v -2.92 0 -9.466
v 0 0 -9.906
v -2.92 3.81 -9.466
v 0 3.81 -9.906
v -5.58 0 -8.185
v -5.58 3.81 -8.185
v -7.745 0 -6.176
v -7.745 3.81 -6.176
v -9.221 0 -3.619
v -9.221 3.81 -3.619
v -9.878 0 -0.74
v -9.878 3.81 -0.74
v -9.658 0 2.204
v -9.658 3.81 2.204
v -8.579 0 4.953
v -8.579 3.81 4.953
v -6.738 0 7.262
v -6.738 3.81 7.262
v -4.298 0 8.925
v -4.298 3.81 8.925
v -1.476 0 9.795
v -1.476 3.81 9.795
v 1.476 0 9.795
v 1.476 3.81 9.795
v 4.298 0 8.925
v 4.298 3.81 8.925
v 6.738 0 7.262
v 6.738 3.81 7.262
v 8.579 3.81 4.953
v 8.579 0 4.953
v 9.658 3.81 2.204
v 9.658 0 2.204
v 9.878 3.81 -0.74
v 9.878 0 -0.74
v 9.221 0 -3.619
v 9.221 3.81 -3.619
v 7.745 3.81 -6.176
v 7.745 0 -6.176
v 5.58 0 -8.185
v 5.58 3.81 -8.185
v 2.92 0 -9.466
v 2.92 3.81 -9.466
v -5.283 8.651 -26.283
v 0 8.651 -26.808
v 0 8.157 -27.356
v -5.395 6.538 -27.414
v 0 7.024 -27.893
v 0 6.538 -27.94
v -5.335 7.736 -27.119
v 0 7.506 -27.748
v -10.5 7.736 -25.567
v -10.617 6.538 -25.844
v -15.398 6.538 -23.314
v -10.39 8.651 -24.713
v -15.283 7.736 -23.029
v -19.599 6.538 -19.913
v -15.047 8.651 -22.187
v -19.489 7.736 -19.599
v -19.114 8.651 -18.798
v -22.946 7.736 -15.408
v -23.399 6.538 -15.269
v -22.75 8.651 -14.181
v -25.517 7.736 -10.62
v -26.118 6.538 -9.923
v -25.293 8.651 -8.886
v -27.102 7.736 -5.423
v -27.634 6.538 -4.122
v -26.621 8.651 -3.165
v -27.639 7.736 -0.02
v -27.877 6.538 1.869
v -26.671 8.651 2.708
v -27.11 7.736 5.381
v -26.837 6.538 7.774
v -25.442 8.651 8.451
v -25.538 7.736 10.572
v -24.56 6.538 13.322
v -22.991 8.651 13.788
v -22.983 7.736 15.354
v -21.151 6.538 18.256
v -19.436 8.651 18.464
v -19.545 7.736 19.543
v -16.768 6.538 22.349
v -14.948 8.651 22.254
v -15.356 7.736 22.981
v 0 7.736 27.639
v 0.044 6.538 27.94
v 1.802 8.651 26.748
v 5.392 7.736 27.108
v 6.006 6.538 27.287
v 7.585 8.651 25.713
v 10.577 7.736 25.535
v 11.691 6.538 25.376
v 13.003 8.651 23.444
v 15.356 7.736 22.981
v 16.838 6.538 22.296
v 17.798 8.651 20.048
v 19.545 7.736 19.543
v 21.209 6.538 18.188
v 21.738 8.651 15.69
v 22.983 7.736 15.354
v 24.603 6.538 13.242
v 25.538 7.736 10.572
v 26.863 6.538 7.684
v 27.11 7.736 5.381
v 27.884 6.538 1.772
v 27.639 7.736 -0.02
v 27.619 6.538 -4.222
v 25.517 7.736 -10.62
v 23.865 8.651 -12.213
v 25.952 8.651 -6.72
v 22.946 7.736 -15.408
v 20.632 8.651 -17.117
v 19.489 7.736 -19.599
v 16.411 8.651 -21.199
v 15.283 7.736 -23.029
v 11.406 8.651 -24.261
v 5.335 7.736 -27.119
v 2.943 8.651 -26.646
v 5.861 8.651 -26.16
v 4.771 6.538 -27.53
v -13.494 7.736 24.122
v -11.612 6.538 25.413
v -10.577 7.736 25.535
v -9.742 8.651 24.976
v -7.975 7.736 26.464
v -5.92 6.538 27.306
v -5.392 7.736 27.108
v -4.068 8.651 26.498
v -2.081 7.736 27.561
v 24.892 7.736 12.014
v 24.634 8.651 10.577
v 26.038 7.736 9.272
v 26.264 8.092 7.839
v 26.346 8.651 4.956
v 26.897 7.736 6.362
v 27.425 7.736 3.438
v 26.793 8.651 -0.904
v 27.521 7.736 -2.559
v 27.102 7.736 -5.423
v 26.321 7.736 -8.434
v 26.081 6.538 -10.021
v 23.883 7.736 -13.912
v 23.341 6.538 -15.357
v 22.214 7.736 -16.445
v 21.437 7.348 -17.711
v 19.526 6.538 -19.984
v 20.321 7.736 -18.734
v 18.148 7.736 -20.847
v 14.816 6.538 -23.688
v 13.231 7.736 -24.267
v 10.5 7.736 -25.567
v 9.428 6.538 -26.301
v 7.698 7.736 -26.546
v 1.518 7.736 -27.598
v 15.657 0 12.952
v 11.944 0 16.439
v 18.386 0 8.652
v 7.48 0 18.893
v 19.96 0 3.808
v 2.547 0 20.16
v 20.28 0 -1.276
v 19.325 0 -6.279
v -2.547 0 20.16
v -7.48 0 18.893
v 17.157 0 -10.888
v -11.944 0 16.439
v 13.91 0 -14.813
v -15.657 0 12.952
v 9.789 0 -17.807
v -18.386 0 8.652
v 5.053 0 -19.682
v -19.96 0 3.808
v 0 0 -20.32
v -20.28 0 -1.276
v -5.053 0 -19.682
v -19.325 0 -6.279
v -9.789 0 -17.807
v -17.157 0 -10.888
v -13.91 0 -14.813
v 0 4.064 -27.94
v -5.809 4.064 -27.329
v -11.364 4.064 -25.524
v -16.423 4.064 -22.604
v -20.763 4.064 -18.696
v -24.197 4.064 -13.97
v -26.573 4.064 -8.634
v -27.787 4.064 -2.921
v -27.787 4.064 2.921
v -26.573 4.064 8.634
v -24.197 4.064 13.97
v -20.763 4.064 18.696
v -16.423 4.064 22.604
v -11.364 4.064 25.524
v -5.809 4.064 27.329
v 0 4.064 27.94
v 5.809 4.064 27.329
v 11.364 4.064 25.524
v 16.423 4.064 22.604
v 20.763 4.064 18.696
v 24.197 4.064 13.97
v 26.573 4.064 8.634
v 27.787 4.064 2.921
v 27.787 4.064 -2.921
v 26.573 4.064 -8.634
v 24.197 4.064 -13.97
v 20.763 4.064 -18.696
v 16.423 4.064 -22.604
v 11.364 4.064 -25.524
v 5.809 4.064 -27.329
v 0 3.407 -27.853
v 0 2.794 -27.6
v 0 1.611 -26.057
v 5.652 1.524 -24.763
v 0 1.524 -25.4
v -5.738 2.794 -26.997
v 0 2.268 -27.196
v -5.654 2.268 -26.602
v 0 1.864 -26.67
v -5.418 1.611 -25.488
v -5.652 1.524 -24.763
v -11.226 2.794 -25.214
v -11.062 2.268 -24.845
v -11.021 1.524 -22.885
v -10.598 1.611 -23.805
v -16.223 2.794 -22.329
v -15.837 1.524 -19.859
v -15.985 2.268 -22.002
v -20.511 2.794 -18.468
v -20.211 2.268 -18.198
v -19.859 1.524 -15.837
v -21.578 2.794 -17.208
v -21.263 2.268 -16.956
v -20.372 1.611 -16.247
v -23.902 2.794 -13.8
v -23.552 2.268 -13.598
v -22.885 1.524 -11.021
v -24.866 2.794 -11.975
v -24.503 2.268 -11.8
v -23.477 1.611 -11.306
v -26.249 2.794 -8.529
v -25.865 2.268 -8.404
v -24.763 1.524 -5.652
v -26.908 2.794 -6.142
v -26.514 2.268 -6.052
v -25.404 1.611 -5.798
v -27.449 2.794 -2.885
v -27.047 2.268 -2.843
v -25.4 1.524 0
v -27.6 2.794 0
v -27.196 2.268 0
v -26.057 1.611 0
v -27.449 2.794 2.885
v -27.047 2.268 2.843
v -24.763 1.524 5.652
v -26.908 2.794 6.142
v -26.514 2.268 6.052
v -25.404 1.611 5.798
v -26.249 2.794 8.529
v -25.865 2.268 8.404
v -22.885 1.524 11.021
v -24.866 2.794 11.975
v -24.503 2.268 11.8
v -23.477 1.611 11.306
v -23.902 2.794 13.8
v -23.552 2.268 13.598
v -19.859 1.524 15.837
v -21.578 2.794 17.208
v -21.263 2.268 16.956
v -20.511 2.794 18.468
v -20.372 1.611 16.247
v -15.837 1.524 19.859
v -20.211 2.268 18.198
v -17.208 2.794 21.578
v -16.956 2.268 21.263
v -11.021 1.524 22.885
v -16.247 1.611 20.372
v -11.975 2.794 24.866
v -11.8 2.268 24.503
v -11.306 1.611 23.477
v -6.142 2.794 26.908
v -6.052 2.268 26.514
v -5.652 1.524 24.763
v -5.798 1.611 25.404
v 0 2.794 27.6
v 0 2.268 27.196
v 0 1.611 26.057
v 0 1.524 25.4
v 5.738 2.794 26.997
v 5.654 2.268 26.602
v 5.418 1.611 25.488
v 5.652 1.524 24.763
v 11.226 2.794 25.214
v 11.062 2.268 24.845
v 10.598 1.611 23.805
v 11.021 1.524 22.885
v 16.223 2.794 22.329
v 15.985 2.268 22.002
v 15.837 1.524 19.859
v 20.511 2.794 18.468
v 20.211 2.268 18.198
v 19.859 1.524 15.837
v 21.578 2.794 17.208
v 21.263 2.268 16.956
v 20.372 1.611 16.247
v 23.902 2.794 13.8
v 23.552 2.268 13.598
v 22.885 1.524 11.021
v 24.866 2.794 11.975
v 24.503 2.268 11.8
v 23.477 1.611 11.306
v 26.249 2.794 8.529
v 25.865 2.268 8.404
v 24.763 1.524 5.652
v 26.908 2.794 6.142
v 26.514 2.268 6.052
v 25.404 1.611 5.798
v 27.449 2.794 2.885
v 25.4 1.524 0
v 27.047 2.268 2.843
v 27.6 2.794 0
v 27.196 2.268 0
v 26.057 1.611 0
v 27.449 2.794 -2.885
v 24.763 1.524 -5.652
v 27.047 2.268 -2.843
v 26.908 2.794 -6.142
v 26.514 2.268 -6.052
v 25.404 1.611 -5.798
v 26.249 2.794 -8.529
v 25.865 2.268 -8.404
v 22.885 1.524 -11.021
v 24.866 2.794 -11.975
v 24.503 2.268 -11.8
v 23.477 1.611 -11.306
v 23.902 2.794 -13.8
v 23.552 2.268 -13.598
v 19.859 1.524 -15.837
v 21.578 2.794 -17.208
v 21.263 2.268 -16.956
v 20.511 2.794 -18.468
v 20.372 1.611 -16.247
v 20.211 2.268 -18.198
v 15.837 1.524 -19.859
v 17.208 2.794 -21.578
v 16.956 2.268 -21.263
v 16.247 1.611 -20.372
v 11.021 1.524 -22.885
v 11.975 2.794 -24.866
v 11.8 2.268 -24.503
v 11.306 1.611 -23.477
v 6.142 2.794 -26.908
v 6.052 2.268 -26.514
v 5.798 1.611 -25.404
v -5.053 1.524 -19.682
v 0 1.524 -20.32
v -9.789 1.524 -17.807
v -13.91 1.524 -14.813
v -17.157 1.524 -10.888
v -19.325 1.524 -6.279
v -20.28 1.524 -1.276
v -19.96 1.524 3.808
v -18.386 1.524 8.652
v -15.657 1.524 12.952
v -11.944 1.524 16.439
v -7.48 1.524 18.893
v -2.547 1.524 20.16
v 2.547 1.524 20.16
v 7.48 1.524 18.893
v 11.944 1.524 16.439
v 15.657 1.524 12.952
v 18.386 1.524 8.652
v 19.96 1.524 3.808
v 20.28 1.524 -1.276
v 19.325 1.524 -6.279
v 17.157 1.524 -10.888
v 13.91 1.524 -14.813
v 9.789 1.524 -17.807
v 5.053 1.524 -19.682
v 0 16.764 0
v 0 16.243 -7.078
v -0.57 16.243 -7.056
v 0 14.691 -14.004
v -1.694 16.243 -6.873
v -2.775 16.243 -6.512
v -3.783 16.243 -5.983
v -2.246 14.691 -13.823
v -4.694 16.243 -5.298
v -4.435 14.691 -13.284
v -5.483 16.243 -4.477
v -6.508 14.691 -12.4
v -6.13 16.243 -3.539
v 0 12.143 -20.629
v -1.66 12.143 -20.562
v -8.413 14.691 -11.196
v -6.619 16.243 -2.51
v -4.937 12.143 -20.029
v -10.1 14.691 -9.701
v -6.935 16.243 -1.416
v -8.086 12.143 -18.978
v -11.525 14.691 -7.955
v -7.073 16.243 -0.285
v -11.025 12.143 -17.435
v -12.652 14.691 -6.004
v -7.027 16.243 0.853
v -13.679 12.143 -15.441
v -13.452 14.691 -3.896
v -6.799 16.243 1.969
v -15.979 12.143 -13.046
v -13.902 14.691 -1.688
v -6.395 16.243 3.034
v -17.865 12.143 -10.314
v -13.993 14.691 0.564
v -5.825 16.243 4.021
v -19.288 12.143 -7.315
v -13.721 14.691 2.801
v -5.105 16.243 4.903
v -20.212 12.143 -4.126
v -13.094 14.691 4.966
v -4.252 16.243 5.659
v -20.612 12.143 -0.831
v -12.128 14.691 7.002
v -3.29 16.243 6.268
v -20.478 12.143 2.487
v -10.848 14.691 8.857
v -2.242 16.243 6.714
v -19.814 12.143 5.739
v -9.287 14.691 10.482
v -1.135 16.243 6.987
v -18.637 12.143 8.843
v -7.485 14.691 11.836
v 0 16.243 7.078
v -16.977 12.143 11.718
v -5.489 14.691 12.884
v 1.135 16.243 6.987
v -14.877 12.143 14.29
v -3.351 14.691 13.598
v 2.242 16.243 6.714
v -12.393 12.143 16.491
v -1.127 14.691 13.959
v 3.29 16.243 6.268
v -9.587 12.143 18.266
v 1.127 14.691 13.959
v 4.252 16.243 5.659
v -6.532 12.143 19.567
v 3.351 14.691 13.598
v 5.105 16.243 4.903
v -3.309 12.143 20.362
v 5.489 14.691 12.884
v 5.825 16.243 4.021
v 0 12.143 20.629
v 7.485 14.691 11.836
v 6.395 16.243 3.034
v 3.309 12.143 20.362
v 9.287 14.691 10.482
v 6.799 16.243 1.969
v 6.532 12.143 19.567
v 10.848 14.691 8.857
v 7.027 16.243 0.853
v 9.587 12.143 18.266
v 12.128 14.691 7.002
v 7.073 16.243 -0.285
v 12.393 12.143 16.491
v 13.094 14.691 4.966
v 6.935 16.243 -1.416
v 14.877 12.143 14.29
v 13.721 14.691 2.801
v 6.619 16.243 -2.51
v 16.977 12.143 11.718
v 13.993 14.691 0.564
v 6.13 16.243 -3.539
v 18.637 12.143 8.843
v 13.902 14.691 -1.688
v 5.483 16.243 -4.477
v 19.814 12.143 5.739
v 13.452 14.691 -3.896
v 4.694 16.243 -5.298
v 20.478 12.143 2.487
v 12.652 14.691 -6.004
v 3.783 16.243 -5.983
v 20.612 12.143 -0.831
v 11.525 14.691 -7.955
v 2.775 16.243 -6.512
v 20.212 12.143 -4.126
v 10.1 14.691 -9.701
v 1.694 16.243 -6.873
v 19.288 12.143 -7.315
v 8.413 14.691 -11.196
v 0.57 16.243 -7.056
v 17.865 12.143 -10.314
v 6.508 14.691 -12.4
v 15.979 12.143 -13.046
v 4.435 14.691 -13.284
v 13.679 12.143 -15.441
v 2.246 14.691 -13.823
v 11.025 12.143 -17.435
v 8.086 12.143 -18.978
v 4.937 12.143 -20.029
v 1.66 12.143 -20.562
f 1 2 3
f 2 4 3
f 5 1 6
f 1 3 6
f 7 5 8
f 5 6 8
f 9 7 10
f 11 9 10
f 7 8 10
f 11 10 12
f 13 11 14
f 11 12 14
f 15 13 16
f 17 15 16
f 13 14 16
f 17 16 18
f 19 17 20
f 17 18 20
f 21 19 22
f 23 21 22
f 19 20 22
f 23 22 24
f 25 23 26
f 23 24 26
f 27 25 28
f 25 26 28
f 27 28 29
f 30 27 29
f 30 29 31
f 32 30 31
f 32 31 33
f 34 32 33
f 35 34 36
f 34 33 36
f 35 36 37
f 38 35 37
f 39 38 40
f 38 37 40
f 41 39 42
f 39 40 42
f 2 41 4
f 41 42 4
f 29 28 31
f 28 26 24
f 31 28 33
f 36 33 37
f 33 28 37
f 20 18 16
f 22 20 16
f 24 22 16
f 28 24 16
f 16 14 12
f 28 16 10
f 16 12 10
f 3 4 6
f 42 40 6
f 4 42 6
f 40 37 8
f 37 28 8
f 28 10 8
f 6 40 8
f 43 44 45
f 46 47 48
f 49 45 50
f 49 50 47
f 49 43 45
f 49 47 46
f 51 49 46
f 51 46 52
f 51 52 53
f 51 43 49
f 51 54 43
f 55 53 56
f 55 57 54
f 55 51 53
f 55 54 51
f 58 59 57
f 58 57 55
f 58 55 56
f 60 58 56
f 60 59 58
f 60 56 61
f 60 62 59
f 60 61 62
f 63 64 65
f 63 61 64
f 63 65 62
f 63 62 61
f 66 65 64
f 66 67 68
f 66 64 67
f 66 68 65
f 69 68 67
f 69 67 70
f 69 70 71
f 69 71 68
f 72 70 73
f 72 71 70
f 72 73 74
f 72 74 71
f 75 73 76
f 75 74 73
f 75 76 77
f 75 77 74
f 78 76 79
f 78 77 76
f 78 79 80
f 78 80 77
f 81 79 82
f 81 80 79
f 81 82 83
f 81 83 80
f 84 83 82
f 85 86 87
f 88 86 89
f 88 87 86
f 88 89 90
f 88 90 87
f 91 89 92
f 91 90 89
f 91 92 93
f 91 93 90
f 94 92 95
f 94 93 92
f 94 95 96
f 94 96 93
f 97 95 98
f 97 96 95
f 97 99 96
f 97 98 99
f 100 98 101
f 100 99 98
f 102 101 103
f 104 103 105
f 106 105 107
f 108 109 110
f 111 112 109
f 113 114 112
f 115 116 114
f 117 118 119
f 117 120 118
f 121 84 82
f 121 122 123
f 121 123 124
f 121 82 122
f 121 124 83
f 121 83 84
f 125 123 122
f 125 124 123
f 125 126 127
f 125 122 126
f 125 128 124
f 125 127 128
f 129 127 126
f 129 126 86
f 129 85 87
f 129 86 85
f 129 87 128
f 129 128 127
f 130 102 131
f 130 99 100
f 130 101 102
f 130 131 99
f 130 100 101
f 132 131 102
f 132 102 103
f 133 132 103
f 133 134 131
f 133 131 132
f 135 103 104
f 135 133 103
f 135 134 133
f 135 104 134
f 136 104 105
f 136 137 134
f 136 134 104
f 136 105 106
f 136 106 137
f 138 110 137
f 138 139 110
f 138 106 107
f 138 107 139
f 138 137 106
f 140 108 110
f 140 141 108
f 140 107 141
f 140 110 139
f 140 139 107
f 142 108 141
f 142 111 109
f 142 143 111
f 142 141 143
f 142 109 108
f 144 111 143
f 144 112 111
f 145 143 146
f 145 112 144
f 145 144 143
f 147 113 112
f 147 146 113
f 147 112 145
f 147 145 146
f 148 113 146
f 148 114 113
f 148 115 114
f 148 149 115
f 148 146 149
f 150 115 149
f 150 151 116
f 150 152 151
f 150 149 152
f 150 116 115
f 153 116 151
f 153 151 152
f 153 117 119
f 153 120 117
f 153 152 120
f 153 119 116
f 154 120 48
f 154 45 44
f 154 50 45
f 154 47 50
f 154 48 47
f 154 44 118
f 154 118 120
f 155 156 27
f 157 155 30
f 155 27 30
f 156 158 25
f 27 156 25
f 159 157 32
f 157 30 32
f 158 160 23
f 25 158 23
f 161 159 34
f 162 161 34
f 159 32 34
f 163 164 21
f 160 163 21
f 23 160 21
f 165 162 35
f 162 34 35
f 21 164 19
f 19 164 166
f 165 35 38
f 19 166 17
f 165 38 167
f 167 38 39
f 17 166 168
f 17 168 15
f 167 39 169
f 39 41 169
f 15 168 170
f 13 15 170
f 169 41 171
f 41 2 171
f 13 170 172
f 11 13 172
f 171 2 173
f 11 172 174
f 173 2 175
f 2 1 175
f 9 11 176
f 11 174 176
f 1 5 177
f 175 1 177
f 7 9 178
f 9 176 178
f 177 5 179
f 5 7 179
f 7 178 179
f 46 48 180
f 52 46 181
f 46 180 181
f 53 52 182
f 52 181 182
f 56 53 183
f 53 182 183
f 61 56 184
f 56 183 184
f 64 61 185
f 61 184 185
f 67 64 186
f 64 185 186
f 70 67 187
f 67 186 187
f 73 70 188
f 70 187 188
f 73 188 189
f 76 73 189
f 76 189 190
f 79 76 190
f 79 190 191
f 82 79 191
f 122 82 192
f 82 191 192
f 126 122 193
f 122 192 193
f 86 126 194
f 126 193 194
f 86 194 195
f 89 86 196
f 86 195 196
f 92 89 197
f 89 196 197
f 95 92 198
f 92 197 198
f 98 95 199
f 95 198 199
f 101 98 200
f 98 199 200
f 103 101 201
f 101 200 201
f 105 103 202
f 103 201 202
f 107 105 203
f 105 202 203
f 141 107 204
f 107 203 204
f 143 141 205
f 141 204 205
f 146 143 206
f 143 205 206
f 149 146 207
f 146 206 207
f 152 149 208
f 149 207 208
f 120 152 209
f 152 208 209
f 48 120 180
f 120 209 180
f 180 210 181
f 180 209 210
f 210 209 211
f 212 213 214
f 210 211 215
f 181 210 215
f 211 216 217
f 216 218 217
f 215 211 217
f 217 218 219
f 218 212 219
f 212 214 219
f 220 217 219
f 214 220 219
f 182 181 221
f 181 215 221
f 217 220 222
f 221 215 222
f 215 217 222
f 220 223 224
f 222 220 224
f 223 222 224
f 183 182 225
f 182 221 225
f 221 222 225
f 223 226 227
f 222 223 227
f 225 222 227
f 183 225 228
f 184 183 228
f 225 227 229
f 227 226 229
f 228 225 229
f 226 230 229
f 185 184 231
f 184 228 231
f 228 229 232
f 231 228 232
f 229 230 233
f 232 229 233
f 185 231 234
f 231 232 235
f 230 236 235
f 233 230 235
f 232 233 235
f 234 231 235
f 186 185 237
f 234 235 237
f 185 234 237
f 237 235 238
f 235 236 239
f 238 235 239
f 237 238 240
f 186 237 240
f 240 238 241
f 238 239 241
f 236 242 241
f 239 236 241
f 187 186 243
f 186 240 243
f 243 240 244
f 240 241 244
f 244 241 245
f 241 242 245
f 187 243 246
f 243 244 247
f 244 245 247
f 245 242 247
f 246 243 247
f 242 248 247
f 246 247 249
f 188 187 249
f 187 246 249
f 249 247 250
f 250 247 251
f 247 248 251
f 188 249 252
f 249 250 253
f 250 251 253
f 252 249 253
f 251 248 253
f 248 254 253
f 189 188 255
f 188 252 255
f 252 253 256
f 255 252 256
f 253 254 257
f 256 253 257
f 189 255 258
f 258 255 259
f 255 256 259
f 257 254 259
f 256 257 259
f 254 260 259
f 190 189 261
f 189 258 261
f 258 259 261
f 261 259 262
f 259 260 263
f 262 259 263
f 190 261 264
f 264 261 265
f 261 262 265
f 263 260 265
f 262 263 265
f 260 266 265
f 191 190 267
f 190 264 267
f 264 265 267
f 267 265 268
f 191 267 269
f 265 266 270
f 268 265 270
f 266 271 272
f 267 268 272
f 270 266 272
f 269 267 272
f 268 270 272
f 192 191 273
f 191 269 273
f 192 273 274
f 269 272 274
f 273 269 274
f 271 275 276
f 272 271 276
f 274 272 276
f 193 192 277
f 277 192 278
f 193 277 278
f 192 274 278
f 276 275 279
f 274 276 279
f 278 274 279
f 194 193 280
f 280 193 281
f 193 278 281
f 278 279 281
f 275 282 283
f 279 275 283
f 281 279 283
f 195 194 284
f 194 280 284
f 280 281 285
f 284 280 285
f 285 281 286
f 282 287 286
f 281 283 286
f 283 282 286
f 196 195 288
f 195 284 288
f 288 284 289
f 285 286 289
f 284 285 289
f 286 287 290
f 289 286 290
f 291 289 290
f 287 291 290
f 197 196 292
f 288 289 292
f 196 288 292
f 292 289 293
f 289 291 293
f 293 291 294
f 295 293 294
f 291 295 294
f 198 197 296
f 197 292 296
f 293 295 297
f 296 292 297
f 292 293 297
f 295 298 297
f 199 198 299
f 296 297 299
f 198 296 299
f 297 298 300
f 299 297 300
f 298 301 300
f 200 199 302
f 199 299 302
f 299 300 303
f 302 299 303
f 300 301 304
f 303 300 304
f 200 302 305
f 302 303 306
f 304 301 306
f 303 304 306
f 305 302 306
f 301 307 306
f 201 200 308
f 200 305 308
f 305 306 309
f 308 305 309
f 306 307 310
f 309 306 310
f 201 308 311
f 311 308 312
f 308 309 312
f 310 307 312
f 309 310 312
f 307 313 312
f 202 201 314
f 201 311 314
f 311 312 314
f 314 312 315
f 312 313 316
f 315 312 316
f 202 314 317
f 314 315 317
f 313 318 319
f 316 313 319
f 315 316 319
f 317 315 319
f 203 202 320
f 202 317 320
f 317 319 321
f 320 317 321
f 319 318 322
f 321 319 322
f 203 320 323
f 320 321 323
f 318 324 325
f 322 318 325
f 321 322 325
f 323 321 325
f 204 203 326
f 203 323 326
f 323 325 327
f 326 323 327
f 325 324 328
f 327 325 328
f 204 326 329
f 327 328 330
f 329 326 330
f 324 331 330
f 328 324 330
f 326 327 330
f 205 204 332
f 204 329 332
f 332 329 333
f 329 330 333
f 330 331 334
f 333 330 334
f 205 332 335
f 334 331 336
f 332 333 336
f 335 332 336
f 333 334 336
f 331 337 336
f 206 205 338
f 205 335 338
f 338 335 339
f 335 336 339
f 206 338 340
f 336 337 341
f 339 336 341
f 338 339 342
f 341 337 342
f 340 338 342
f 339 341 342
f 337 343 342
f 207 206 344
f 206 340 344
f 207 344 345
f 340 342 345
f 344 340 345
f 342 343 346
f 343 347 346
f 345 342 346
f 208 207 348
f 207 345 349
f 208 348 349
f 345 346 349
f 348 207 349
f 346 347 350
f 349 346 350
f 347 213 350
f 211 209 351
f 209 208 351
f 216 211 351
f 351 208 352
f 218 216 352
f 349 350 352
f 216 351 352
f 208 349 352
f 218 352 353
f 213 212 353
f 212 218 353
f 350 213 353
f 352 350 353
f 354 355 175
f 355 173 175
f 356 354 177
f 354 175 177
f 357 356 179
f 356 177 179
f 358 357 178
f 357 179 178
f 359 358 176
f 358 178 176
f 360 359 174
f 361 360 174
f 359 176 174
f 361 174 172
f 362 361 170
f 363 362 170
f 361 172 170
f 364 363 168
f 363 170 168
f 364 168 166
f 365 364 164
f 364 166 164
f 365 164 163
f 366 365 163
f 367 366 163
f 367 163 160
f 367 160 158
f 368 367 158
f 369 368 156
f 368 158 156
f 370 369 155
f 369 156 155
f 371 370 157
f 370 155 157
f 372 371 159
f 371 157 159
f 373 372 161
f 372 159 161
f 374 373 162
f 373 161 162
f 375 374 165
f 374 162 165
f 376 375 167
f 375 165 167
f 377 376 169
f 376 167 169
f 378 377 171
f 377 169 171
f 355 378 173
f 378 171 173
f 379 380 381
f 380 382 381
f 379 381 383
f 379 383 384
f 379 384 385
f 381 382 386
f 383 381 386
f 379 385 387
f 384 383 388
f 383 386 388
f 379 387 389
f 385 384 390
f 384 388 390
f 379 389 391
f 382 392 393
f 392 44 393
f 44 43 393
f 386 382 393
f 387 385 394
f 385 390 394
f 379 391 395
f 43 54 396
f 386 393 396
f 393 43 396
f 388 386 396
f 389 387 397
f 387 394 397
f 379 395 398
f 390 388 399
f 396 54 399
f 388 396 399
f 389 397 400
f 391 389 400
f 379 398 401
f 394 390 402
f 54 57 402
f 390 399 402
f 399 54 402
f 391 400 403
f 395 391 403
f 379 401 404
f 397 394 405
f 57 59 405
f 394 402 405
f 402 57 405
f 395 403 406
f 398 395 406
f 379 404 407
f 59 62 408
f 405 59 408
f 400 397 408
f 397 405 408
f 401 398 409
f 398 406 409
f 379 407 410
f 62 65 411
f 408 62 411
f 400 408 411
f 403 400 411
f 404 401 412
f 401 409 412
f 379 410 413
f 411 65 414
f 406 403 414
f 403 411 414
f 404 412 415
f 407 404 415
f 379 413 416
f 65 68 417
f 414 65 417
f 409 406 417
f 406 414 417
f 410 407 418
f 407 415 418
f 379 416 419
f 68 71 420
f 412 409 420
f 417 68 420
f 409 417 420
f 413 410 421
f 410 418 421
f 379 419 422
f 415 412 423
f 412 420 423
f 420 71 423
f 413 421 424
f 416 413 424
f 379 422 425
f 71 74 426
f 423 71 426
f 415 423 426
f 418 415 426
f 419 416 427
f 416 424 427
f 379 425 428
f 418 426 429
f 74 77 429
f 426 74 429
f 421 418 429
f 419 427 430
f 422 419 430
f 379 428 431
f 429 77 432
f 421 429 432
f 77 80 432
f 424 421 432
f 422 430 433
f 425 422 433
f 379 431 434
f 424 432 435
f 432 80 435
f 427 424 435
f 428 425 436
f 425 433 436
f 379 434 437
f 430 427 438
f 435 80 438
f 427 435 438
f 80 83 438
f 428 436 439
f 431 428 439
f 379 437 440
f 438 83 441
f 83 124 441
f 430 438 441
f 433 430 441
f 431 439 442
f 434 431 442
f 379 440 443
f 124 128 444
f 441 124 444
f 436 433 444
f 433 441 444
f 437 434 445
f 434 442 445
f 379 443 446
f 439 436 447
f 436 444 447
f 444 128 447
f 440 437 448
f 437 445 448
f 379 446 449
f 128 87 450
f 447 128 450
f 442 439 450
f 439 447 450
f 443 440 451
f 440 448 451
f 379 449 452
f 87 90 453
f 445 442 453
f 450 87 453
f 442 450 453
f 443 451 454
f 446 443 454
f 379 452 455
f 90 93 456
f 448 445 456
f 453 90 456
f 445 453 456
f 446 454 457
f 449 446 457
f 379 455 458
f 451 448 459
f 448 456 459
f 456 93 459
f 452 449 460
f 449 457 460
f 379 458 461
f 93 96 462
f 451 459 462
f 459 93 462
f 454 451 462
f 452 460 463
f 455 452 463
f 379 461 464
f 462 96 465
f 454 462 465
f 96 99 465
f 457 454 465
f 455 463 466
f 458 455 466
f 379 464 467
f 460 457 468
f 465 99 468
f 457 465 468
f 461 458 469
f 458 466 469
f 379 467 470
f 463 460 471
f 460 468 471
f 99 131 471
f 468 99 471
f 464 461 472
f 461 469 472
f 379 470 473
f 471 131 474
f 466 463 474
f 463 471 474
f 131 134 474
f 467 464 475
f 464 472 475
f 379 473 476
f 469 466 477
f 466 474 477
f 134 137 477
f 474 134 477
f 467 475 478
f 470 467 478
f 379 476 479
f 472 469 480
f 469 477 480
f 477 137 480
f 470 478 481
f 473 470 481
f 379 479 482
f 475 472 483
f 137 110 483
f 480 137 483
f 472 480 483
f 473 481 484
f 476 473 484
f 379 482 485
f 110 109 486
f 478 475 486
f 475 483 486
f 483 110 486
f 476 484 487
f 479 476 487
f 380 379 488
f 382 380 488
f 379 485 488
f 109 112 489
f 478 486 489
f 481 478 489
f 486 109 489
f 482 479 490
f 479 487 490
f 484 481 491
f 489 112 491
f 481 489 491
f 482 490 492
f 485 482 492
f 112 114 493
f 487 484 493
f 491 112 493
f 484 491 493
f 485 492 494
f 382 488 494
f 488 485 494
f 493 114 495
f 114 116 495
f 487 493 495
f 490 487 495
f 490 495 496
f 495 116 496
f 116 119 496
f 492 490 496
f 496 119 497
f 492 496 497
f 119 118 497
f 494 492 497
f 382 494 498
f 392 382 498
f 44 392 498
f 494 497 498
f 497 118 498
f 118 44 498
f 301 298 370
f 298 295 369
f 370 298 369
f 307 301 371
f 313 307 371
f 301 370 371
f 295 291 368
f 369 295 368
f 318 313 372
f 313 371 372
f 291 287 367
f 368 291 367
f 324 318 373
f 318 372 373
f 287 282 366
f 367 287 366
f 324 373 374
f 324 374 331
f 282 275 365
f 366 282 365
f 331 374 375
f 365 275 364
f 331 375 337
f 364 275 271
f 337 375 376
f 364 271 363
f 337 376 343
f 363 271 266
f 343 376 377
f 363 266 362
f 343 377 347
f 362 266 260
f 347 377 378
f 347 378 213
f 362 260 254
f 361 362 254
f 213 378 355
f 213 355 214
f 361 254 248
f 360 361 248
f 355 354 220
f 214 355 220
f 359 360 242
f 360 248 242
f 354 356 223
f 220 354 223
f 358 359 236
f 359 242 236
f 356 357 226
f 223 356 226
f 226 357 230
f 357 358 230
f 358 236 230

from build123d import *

# Parameters (mm, degrees)
FILLET1_R = 2.54


with BuildPart() as part:
    # Sketch1 → Revolve1 (revolve)
    with BuildSketch(Plane(origin=(0, 0, 0), x_dir=(0, 0, -1), z_dir=(1, 0, 0))):
        with BuildLine():
            Line((0, 3.81), (0, 16.764))
            ThreePointArc((0, 16.764), (14.660113403, 14.487927839), (27.94, 7.874))
            Line((27.94, 7.874), (27.94, 1.524))
            Line((27.94, 1.524), (20.32, 1.524))
            Line((20.32, 1.524), (20.32, 0))
            Line((20.32, 0), (9.906, 0))
            Line((9.906, 0), (9.906, 3.81))
            Line((9.906, 3.81), (0, 3.81))
        make_face()
    revolve(axis=Axis((0, 3.81, 0), (0, 1, 0)))

    # Fillet1
    fillet1_edges = [part.edges().sort_by_distance(p)[0] for p in [
        (0, 7.874, 27.94),
        (0, 1.524, 27.94),
    ]]
    fillet(fillet1_edges, radius=FILLET1_R)


solid = part.part
